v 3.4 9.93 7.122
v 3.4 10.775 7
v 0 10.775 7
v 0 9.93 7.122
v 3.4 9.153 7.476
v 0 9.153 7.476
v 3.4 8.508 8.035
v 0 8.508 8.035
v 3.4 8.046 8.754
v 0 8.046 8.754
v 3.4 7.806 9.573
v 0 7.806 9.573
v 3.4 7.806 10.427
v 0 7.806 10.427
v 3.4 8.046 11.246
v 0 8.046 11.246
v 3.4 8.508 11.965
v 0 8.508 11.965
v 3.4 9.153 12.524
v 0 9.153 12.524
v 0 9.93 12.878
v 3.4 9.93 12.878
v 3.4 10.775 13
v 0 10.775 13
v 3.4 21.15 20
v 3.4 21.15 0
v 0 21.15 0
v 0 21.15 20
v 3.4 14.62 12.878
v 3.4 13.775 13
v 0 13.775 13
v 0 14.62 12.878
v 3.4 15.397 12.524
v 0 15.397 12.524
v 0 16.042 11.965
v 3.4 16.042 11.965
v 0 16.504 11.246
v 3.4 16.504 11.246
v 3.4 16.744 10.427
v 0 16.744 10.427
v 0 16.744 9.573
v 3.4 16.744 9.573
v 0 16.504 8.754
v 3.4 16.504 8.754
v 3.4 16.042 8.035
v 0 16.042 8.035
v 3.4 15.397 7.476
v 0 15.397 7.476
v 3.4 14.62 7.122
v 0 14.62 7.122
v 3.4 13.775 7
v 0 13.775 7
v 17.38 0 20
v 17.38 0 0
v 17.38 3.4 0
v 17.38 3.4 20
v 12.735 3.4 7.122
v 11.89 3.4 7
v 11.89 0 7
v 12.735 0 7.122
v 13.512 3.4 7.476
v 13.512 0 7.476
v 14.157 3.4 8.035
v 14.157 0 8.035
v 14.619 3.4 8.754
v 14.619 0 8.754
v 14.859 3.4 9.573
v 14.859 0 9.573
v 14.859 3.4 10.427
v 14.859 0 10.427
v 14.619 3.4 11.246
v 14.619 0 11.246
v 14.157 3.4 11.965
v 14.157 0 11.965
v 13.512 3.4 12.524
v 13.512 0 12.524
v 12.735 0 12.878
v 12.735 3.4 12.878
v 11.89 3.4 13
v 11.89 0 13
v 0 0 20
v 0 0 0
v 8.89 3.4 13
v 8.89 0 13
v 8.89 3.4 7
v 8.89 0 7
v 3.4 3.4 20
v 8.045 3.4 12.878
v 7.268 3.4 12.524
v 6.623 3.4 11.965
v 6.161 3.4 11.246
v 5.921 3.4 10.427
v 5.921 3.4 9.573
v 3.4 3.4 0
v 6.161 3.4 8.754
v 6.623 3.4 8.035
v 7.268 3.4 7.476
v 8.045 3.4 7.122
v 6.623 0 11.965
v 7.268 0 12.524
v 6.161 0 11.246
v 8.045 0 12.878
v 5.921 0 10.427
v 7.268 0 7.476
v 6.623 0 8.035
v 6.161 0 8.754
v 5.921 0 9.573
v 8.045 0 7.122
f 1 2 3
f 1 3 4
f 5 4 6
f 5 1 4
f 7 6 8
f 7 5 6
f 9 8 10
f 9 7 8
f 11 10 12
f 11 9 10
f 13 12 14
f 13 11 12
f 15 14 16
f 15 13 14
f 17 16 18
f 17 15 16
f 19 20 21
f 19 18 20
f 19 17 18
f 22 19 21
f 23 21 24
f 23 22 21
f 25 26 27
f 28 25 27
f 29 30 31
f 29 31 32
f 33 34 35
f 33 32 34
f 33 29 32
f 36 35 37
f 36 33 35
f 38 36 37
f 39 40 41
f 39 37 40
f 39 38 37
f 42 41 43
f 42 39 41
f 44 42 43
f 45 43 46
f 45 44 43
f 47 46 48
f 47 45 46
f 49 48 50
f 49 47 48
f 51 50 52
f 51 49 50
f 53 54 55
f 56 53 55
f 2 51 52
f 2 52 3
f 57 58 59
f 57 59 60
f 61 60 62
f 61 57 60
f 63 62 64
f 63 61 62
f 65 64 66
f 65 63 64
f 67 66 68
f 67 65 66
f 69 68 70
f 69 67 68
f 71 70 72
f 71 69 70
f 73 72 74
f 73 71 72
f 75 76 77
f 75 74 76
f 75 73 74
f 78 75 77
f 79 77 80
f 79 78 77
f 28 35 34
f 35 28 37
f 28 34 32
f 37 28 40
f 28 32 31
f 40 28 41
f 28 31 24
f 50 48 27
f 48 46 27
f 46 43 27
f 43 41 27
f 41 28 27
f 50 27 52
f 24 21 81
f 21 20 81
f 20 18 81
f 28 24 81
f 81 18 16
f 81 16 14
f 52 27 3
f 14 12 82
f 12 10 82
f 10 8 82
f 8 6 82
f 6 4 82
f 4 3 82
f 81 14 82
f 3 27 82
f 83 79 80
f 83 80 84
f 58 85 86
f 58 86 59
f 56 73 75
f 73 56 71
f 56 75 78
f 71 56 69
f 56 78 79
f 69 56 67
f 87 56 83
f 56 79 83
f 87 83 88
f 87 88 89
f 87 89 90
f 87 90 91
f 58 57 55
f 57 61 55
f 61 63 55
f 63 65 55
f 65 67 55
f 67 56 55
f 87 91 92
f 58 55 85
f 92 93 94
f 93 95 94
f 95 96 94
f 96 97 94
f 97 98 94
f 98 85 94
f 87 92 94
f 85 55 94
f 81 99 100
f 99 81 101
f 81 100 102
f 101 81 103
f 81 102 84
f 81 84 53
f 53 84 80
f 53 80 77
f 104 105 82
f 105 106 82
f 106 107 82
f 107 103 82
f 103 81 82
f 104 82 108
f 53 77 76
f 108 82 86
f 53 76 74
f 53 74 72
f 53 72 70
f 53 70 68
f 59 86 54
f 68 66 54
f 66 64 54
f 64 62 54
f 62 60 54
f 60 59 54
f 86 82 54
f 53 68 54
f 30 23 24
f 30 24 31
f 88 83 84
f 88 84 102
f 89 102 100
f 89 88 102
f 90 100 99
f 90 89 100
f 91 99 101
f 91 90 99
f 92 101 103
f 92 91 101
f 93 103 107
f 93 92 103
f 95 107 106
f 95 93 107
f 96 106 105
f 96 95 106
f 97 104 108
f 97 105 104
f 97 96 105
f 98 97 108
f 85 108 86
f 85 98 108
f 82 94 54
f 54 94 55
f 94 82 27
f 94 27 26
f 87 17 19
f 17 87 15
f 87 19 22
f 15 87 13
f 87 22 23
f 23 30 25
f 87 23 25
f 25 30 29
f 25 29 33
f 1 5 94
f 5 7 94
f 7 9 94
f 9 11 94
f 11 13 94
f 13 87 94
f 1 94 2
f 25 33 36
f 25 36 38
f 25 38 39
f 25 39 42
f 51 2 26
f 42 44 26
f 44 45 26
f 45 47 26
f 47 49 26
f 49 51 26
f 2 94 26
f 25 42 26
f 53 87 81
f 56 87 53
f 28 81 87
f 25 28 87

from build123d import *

# Parameters (mm, degrees)
BOSS_EXTRUDE2_DEPTH = 20
CUT_EXTRUDE1_DEPTH  = 20
CUT_EXTRUDE2_DEPTH  = 20


with BuildPart() as part:
    # Sketch1 → Boss-Extrude2 (new body)
    with BuildSketch(Plane.XY):
        Polygon((0, 0), (17.38, 0), (17.38, 3.4), (3.4, 3.4), (3.4, 21.15), (0, 21.15), align=None)
    extrude(amount=BOSS_EXTRUDE2_DEPTH)

    # Sketch2 → Cut-Extrude1 (cut)
    with BuildSketch(Plane(origin=(3.4, 0, 0), x_dir=(0, 0, -1), z_dir=(1, 0, 0))):
        with BuildLine():
            Line((-7, 13.775), (-7, 10.775))
            ThreePointArc((-7, 10.775), (-10, 7.775), (-13, 10.775))
            Line((-13, 10.775), (-13, 13.775))
            ThreePointArc((-13, 13.775), (-10, 16.775), (-7, 13.775))
        make_face()
    extrude(amount=-CUT_EXTRUDE1_DEPTH, mode=Mode.SUBTRACT)

    # Sketch3 → Cut-Extrude2 (cut)
    with BuildSketch(Plane(origin=(0, 3.4, 0), x_dir=(1, 0, 0), z_dir=(0, 1, 0))):
        with BuildLine():
            Line((8.89, -7), (11.89, -7))
            ThreePointArc((11.89, -7), (14.89, -10), (11.89, -13))
            Line((11.89, -13), (8.89, -13))
            ThreePointArc((8.89, -13), (5.89, -10), (8.89, -7))
        make_face()
    extrude(amount=-CUT_EXTRUDE2_DEPTH, mode=Mode.SUBTRACT)


solid = part.part
